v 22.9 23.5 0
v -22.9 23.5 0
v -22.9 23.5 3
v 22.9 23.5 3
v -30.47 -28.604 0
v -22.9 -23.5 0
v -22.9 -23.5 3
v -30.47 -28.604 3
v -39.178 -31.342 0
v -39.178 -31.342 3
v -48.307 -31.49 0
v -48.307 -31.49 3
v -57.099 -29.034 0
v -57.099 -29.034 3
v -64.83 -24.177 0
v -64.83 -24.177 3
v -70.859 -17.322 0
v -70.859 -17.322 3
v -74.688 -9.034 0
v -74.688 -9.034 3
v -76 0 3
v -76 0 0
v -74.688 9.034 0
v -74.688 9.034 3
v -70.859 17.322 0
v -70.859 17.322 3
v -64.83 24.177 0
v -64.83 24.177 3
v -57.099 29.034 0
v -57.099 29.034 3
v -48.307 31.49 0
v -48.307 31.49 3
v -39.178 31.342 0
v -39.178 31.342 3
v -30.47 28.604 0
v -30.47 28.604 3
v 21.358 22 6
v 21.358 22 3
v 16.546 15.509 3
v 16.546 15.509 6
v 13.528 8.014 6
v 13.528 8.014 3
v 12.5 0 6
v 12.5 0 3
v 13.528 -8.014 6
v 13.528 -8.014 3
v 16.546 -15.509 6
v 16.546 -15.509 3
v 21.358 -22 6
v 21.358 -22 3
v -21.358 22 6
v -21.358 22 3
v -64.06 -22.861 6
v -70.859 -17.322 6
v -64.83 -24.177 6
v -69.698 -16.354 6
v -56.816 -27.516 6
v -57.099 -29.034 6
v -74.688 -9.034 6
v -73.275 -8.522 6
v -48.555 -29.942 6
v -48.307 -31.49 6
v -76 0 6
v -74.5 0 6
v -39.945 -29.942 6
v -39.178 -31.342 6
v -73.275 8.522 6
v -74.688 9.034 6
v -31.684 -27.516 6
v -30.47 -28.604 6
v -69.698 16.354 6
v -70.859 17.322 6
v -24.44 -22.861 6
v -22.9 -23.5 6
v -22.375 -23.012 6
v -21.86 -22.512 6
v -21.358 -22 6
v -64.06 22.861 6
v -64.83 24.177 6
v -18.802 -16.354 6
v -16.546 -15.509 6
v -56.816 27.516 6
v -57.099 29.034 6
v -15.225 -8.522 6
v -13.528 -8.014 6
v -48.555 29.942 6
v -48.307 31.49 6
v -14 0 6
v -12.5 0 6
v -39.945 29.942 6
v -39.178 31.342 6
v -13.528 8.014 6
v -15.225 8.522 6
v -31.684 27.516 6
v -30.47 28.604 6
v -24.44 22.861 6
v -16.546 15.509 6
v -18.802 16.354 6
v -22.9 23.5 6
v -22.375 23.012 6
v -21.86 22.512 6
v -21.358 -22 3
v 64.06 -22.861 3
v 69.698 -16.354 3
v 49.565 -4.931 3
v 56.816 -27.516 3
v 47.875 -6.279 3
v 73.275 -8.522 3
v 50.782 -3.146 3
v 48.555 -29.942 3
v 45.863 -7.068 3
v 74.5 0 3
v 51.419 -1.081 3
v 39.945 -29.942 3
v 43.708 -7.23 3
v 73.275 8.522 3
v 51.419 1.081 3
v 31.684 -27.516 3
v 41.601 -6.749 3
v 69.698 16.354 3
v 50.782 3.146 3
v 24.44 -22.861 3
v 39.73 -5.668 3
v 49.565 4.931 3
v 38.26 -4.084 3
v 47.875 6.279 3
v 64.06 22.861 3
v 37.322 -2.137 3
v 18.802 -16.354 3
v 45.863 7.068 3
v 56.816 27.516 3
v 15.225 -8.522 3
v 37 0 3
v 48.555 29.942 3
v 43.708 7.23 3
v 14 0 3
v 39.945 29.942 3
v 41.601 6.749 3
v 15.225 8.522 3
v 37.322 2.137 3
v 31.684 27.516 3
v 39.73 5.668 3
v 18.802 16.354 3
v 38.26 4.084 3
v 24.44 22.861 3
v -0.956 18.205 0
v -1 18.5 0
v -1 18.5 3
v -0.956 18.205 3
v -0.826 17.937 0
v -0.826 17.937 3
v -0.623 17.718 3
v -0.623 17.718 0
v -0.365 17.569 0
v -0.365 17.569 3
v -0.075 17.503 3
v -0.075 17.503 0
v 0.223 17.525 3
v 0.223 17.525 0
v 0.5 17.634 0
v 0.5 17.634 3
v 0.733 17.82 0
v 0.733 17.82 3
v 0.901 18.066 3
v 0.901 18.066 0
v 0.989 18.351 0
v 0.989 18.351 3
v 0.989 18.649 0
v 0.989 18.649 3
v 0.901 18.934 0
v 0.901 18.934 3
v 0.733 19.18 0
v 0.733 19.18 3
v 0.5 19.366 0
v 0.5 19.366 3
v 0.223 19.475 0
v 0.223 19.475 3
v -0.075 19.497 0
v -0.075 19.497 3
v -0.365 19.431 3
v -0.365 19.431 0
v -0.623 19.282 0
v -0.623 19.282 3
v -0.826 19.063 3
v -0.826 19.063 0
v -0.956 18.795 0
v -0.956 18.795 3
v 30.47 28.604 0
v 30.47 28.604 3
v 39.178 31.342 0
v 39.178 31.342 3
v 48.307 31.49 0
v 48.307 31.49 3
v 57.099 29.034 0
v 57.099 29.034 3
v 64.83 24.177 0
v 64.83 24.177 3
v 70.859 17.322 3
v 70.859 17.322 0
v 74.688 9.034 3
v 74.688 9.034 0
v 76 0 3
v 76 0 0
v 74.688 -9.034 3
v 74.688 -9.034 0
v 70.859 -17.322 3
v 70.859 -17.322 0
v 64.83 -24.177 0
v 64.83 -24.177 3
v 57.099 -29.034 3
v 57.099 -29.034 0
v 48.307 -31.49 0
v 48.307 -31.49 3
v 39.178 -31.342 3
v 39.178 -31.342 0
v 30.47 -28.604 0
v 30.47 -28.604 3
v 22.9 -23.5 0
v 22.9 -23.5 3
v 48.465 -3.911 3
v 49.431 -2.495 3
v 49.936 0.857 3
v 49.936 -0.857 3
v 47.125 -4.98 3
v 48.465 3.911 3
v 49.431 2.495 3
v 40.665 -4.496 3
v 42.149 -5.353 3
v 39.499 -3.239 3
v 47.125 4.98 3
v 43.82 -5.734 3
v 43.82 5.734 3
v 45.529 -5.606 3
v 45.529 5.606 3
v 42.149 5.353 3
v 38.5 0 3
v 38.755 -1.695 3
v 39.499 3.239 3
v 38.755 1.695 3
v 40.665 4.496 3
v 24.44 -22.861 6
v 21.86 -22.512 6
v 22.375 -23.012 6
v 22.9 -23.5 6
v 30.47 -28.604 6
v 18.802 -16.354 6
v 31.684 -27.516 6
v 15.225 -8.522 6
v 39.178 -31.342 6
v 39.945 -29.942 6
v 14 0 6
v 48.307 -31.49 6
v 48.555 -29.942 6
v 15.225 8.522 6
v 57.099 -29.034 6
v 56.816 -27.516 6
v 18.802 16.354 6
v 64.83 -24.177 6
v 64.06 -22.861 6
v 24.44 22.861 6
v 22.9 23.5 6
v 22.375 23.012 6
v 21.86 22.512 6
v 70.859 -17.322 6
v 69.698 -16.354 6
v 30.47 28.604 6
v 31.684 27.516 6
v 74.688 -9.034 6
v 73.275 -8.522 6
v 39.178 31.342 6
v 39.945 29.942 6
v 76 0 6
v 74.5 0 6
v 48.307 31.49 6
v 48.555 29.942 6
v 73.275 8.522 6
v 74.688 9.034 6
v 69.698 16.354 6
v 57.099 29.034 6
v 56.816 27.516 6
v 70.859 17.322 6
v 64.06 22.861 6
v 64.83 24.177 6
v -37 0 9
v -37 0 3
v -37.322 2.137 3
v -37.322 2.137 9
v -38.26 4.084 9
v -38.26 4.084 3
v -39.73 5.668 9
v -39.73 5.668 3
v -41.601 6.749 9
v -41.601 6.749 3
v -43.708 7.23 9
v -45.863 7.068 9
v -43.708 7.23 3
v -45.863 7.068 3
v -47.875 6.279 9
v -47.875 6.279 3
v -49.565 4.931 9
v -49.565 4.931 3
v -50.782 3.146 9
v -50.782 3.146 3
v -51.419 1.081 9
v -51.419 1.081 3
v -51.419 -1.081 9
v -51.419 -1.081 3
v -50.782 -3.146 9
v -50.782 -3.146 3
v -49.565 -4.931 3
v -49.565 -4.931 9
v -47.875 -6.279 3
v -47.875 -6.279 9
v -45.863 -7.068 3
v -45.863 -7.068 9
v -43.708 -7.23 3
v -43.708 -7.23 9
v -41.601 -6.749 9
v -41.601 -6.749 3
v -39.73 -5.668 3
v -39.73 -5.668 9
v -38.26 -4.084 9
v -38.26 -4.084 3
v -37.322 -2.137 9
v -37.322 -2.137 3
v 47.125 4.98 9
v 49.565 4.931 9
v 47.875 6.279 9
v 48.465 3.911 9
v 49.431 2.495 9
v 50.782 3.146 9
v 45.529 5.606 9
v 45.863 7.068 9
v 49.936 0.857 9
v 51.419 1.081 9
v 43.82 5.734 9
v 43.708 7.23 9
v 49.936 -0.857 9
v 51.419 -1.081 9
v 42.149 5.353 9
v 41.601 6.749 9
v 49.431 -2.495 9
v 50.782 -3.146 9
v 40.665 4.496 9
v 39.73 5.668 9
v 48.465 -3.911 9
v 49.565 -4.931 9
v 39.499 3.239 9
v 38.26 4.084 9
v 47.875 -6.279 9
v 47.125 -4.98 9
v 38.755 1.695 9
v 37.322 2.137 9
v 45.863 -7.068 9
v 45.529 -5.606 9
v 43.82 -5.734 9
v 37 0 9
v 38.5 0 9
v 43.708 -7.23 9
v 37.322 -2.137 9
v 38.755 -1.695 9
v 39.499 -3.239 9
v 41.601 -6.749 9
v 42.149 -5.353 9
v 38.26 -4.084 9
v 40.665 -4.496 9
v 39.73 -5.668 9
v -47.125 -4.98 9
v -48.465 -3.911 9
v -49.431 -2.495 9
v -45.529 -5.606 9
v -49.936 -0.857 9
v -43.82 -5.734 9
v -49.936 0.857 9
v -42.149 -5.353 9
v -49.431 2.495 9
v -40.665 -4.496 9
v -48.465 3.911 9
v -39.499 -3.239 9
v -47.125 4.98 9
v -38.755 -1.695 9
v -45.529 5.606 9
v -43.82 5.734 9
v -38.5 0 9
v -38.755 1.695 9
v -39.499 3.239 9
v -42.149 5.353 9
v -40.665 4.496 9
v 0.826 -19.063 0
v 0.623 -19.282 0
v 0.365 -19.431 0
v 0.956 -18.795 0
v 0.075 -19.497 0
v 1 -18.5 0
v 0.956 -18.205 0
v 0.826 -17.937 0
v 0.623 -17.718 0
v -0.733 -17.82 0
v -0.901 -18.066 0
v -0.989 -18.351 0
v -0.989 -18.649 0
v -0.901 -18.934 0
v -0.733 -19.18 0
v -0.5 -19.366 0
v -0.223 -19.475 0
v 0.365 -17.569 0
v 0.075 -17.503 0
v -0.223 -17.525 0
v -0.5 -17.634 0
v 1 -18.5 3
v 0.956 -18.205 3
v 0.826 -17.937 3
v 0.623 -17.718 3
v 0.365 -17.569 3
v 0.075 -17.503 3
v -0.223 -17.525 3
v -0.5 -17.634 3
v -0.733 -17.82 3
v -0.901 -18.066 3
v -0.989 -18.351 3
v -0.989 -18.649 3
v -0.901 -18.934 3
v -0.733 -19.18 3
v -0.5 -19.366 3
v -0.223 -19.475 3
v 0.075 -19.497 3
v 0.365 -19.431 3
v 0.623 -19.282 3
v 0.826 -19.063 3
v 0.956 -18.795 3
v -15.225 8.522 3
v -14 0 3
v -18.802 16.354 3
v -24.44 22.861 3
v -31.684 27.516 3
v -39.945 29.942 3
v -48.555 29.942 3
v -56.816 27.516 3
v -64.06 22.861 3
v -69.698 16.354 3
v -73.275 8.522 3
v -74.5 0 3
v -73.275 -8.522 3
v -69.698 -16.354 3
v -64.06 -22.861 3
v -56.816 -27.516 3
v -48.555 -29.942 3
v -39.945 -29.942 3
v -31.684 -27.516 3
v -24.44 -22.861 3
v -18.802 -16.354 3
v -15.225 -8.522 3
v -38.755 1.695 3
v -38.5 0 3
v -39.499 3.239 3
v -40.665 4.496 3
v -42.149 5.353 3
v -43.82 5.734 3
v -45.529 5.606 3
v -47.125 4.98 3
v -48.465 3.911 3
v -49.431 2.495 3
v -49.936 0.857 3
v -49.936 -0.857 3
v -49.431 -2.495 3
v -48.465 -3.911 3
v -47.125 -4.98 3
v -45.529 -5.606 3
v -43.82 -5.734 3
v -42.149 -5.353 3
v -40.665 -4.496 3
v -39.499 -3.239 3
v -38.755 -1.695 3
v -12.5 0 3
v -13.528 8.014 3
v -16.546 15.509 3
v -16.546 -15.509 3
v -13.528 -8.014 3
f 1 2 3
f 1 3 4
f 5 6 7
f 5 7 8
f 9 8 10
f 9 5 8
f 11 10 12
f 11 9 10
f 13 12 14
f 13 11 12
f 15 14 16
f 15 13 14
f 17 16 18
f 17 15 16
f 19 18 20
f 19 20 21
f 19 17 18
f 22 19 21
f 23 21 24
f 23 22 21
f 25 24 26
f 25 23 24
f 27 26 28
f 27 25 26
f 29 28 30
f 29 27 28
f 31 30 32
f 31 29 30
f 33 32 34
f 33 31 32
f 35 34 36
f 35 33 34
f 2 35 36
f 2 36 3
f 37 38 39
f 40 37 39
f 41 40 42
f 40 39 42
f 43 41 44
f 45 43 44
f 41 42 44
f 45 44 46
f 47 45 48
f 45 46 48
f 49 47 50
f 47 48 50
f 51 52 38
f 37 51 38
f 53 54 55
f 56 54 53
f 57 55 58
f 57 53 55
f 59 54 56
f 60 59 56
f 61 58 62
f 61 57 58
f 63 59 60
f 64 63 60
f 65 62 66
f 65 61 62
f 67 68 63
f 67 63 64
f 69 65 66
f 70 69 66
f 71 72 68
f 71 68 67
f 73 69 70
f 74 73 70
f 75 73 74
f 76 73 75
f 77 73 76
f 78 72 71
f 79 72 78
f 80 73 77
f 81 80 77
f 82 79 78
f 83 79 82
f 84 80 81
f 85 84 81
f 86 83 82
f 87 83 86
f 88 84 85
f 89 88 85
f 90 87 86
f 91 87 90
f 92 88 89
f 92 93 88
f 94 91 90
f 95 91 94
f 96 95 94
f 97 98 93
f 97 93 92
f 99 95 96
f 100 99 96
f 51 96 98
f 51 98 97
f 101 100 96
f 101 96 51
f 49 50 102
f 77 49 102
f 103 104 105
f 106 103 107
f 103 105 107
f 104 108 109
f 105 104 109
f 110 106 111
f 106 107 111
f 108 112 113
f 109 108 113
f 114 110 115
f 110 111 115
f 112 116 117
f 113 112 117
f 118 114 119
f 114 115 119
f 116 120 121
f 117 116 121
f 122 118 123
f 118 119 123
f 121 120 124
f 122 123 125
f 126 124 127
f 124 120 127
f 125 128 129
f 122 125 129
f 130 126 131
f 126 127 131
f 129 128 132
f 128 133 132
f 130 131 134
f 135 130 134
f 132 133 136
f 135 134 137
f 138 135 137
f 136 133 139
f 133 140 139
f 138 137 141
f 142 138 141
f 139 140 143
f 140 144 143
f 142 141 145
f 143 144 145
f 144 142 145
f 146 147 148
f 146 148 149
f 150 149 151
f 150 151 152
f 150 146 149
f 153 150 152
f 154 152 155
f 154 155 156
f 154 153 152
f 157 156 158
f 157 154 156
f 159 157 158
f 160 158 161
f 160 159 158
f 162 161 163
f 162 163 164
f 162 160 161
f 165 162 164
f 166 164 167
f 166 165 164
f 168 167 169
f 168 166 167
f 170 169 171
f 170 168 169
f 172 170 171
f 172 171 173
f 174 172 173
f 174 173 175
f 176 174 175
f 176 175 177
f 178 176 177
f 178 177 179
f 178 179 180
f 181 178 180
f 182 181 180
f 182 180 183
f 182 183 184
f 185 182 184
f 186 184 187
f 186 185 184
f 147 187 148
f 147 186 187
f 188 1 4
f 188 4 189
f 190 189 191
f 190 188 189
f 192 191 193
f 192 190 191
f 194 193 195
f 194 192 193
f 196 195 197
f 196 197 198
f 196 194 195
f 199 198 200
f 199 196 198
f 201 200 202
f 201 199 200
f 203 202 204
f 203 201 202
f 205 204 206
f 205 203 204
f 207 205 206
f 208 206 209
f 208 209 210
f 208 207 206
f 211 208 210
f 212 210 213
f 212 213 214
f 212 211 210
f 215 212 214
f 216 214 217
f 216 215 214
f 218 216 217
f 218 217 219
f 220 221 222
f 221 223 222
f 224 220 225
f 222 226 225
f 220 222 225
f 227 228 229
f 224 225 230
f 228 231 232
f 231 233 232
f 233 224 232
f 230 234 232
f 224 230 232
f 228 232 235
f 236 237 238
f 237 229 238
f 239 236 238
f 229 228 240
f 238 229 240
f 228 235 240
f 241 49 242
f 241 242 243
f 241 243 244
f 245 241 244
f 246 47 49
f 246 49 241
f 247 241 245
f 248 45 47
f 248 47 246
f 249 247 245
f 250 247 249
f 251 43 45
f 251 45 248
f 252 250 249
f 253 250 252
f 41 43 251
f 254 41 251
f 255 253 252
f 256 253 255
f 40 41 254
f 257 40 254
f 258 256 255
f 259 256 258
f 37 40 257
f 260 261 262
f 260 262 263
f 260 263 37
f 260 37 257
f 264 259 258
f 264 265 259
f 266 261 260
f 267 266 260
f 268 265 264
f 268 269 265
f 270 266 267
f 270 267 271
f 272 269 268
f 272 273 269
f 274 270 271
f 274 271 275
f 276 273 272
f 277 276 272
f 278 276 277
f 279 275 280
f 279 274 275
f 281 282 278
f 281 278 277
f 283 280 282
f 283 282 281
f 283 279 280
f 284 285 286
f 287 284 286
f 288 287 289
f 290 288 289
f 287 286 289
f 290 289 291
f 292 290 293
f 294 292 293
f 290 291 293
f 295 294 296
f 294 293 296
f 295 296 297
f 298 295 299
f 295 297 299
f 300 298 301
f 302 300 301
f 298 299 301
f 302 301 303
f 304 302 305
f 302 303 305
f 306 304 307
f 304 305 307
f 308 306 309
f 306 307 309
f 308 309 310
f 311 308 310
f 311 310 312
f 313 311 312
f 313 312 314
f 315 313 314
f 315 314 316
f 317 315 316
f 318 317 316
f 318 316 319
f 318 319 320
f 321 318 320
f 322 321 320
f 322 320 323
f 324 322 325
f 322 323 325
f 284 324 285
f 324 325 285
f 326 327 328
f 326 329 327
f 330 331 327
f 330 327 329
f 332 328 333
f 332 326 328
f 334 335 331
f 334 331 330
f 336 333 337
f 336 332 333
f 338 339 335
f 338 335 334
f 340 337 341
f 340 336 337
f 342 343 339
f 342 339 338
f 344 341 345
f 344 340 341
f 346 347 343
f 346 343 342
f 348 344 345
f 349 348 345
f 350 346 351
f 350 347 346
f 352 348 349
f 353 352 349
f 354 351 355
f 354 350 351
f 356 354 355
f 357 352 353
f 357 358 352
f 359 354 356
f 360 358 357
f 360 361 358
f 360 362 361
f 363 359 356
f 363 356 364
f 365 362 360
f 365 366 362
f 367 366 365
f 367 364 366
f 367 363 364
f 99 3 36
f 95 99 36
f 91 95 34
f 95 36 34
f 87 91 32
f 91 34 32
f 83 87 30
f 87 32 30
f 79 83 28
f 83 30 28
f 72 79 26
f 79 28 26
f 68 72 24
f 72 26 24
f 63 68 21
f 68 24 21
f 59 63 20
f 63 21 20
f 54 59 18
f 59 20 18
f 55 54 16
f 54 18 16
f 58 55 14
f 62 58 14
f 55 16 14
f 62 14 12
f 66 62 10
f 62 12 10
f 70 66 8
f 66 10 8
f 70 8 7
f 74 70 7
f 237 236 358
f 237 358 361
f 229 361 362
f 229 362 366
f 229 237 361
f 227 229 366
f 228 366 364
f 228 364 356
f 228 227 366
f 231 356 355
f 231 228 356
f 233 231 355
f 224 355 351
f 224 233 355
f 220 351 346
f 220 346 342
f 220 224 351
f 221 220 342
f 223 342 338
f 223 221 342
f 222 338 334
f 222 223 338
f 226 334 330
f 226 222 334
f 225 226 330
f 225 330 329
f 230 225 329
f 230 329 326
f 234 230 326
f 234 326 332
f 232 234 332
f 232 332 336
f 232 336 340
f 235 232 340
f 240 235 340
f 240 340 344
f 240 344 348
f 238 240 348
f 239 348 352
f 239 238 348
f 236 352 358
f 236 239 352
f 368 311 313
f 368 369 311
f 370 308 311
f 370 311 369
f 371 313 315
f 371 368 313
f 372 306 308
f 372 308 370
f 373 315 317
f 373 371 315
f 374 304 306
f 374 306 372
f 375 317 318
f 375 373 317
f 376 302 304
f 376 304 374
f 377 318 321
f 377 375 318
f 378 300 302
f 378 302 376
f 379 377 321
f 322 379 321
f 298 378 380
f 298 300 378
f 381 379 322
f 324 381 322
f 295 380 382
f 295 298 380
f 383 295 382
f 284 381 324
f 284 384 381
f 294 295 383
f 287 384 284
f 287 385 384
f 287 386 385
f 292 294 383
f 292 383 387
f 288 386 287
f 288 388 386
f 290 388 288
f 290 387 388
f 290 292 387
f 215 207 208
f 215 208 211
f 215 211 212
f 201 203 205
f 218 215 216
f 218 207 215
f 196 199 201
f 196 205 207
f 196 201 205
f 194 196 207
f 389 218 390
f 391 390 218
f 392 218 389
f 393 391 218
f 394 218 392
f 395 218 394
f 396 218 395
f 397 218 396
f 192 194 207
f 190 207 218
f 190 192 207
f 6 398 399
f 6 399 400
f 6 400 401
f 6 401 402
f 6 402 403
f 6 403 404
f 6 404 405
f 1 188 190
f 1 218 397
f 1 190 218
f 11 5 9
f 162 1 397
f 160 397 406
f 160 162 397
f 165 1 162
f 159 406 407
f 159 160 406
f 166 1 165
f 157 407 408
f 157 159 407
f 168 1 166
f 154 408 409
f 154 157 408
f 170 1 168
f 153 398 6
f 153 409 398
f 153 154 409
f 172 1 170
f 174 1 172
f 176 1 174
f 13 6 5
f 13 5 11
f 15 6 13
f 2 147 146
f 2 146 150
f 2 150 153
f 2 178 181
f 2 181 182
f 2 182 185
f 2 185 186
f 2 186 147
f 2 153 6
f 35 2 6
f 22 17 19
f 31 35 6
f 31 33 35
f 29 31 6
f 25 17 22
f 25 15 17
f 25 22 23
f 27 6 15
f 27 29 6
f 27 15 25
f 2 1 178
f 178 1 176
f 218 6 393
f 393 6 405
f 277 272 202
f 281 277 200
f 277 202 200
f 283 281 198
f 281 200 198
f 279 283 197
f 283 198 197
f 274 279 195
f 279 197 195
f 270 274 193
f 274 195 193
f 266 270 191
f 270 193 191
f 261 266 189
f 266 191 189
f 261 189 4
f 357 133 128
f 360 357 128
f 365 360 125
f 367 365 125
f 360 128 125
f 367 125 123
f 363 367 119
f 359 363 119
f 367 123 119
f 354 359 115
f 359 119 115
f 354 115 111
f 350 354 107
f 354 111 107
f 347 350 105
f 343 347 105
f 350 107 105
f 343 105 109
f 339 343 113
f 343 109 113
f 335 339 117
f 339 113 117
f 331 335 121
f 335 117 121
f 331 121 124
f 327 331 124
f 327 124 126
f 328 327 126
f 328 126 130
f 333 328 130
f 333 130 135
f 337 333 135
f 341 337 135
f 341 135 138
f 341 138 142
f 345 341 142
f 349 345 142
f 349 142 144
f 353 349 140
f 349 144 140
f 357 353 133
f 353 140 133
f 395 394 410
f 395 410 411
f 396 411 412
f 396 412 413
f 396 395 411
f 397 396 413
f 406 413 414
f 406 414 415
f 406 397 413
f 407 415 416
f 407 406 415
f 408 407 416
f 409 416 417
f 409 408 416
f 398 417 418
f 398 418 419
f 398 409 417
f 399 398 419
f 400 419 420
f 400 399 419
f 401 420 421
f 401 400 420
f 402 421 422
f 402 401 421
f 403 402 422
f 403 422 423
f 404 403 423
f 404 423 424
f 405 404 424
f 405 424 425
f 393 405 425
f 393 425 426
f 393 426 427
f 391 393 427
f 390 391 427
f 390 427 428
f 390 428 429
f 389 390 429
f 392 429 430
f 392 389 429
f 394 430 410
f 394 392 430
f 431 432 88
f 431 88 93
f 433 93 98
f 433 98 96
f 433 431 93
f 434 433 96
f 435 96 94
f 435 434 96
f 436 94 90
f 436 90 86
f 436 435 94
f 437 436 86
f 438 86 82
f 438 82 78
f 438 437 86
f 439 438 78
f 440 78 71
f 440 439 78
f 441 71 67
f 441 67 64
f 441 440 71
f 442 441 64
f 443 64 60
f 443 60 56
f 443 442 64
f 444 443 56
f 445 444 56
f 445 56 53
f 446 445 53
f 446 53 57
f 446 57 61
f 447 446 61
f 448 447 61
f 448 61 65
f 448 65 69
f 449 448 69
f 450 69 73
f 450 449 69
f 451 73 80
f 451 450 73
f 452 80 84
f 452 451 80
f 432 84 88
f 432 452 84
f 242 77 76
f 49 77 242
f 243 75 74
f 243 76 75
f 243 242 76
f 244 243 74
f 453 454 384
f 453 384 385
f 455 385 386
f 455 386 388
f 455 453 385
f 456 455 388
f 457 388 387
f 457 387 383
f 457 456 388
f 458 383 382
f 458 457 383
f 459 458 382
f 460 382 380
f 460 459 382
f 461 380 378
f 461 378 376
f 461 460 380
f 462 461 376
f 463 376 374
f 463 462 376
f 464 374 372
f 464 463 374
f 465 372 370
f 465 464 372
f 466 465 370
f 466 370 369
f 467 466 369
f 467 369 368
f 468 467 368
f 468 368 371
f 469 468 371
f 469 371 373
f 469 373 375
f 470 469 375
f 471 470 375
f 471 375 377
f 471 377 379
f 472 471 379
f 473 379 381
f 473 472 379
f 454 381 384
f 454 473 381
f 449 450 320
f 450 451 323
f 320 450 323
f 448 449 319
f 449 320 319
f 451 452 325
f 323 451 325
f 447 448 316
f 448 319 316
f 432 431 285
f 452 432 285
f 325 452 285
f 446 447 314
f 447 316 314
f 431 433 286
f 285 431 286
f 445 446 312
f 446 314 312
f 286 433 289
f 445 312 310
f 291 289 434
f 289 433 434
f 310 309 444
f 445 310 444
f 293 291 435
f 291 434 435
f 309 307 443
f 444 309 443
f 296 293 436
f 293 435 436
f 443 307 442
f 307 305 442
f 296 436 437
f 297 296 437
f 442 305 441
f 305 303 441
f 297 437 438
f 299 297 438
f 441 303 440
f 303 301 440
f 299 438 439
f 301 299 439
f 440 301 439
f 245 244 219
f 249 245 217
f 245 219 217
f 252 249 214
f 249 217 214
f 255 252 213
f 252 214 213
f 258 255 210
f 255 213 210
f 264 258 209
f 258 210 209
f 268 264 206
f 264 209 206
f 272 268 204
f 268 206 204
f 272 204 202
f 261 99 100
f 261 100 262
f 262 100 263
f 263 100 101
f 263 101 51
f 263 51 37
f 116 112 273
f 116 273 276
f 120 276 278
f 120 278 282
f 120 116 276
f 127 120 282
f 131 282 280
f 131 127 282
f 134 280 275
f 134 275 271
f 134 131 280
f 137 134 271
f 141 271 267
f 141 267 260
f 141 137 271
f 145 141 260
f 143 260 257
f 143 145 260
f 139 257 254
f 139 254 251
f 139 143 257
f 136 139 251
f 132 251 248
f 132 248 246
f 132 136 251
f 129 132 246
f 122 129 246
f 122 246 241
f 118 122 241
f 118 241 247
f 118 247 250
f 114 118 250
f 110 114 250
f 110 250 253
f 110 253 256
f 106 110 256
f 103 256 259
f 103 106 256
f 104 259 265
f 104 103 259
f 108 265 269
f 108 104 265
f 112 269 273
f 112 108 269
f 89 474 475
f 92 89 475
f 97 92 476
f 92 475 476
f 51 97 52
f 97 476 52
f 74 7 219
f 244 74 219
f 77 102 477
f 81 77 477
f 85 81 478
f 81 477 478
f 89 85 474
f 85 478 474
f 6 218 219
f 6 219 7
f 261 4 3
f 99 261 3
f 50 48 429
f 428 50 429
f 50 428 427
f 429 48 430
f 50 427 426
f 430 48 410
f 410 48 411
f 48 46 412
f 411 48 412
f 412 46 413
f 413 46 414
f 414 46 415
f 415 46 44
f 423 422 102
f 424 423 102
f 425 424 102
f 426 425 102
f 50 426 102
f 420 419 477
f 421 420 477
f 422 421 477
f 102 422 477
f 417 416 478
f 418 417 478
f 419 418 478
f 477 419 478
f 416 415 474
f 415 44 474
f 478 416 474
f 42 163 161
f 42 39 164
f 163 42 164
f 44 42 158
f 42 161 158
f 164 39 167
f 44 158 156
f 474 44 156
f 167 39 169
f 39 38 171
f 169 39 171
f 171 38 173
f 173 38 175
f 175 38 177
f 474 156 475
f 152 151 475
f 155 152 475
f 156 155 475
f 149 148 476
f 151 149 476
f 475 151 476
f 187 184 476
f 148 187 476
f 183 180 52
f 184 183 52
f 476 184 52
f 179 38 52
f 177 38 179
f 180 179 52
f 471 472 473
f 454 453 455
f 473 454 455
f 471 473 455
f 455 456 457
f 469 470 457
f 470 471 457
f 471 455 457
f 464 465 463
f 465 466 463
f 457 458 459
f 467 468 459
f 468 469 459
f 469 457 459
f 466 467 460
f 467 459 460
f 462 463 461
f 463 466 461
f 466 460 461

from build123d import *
from build123d.topology import SkipClean

# Parameters (mm, degrees)
IZIM2_R                     = 1
Y_KSEKLIK_EKSTR_ZYON1_DEPTH = 3
IZIM3_R                     = 30.25
Y_KSEKLIK_EKSTR_ZYON2_DEPTH = 3
IZIM4_R                     = 7.25
IZIM4_R_2                   = 5.75
Y_KSEKLIK_EKSTR_ZYON3_DEPTH = 6


with BuildPart() as part:
    # Çizim2 → Yükseklik-Ekstrüzyon1 (new body)
    with BuildSketch(Plane.XY):
        with BuildLine():
            Line((-22.900234193, 23.5), (22.900234193, 23.5))
            ThreePointArc((22.900234193, 23.5), (76, 0), (22.900234193, -23.5))
            Line((22.900234193, -23.5), (-22.900234193, -23.5))
            ThreePointArc((-22.900234193, -23.5), (-76, 0), (-22.900234193, 23.5))
        make_face()
        with Locations((0, -18.5)):
            Circle(IZIM2_R, mode=Mode.SUBTRACT)
        with Locations(Location((0, 18.5, 0), (0, 0, 180))):
            Circle(IZIM2_R, mode=Mode.SUBTRACT)
    extrude(amount=Y_KSEKLIK_EKSTR_ZYON1_DEPTH)

    # Çizim3 → Yükseklik-Ekstrüzyon2 (add)
    # profile 1 of 4: a face of its own
    with SkipClean():  # the faces are left unmerged after this step: merging them gives an invalid solid
        with BuildSketch(Plane.XY.offset(3)):
            with BuildLine():
                ThreePointArc((-22.900234193, 23.5), (-76, 0), (-22.900234193, -23.5))
                ThreePointArc((-22.900234193, -23.5), (-22.116200933, -22.763071824), (-21.357588594, -22))
                ThreePointArc((-21.357588594, -22), (-14.797525043, -11.858086647), (-12.5, 0))
                ThreePointArc((-12.5, 0), (-14.797525043, 11.858086647), (-21.357588594, 22))
                ThreePointArc((-21.357588594, 22), (-22.116200933, 22.763071824), (-22.900234193, 23.5))
            make_face()
            with Locations((-44.25, 0)):
                Circle(IZIM3_R, mode=Mode.SUBTRACT)
        # profile 2 of 4: a face of its own
        with BuildSketch(Plane.XY.offset(3)):
            with BuildLine():
                ThreePointArc((21.357588594, -22), (22.116200933, -22.763071824), (22.900234193, -23.5))
                ThreePointArc((22.900234193, -23.5), (57.099269155, -29.033752465), (76, 0))
                ThreePointArc((76, 0), (57.099269155, 29.033752465), (22.900234193, 23.5))
                ThreePointArc((22.900234193, 23.5), (22.116200933, 22.763071824), (21.357588594, 22))
                ThreePointArc((21.357588594, 22), (12.5, 0), (21.357588594, -22))
            make_face()
            with Locations((44.25, 0)):
                Circle(IZIM3_R, mode=Mode.SUBTRACT)
        # profile 3 of 4: a face of its own
        with BuildSketch(Plane.XY.offset(3)):
            with BuildLine():
                ThreePointArc((-21.357588594, -22), (-22.116200933, -22.763071824), (-22.900234193, -23.5))
                Line((-22.900234193, -23.5), (22.900234193, -23.5))
                ThreePointArc((22.900234193, -23.5), (22.116200933, -22.763071824), (21.357588594, -22))
                Line((21.357588594, -22), (-21.357588594, -22))
            make_face()
        # profile 4 of 4: a face of its own
        with BuildSketch(Plane.XY.offset(3)):
            with BuildLine():
                Line((22.900234193, 23.5), (-22.900234193, 23.5))
                ThreePointArc((-22.900234193, 23.5), (-22.116200933, 22.763071824), (-21.357588594, 22))
                Line((-21.357588594, 22), (21.357588594, 22))
                ThreePointArc((21.357588594, 22), (22.116200933, 22.763071824), (22.900234193, 23.5))
            make_face()
        extrude(amount=Y_KSEKLIK_EKSTR_ZYON2_DEPTH)

    # Çizim4 → Yükseklik-Ekstrüzyon3 (add)
    # profile 1 of 2: a face of its own
    with SkipClean():  # the faces are left unmerged after this step: merging them gives an invalid solid
        with BuildSketch(Plane.XY.offset(3)):
            with Locations((-44.25, 0)):
                Circle(IZIM4_R)
            with Locations((-44.25, 0)):
                Circle(IZIM4_R_2, mode=Mode.SUBTRACT)
        # profile 2 of 2: a face of its own
        with BuildSketch(Plane.XY.offset(3)):
            with Locations(Location((44.25, 0, 0), (0, 0, 180))):
                Circle(IZIM4_R)
            with Locations(Location((44.25, 0, 0), (0, 0, 180))):
                Circle(IZIM4_R_2, mode=Mode.SUBTRACT)
        extrude(amount=Y_KSEKLIK_EKSTR_ZYON3_DEPTH)


solid = part.part
